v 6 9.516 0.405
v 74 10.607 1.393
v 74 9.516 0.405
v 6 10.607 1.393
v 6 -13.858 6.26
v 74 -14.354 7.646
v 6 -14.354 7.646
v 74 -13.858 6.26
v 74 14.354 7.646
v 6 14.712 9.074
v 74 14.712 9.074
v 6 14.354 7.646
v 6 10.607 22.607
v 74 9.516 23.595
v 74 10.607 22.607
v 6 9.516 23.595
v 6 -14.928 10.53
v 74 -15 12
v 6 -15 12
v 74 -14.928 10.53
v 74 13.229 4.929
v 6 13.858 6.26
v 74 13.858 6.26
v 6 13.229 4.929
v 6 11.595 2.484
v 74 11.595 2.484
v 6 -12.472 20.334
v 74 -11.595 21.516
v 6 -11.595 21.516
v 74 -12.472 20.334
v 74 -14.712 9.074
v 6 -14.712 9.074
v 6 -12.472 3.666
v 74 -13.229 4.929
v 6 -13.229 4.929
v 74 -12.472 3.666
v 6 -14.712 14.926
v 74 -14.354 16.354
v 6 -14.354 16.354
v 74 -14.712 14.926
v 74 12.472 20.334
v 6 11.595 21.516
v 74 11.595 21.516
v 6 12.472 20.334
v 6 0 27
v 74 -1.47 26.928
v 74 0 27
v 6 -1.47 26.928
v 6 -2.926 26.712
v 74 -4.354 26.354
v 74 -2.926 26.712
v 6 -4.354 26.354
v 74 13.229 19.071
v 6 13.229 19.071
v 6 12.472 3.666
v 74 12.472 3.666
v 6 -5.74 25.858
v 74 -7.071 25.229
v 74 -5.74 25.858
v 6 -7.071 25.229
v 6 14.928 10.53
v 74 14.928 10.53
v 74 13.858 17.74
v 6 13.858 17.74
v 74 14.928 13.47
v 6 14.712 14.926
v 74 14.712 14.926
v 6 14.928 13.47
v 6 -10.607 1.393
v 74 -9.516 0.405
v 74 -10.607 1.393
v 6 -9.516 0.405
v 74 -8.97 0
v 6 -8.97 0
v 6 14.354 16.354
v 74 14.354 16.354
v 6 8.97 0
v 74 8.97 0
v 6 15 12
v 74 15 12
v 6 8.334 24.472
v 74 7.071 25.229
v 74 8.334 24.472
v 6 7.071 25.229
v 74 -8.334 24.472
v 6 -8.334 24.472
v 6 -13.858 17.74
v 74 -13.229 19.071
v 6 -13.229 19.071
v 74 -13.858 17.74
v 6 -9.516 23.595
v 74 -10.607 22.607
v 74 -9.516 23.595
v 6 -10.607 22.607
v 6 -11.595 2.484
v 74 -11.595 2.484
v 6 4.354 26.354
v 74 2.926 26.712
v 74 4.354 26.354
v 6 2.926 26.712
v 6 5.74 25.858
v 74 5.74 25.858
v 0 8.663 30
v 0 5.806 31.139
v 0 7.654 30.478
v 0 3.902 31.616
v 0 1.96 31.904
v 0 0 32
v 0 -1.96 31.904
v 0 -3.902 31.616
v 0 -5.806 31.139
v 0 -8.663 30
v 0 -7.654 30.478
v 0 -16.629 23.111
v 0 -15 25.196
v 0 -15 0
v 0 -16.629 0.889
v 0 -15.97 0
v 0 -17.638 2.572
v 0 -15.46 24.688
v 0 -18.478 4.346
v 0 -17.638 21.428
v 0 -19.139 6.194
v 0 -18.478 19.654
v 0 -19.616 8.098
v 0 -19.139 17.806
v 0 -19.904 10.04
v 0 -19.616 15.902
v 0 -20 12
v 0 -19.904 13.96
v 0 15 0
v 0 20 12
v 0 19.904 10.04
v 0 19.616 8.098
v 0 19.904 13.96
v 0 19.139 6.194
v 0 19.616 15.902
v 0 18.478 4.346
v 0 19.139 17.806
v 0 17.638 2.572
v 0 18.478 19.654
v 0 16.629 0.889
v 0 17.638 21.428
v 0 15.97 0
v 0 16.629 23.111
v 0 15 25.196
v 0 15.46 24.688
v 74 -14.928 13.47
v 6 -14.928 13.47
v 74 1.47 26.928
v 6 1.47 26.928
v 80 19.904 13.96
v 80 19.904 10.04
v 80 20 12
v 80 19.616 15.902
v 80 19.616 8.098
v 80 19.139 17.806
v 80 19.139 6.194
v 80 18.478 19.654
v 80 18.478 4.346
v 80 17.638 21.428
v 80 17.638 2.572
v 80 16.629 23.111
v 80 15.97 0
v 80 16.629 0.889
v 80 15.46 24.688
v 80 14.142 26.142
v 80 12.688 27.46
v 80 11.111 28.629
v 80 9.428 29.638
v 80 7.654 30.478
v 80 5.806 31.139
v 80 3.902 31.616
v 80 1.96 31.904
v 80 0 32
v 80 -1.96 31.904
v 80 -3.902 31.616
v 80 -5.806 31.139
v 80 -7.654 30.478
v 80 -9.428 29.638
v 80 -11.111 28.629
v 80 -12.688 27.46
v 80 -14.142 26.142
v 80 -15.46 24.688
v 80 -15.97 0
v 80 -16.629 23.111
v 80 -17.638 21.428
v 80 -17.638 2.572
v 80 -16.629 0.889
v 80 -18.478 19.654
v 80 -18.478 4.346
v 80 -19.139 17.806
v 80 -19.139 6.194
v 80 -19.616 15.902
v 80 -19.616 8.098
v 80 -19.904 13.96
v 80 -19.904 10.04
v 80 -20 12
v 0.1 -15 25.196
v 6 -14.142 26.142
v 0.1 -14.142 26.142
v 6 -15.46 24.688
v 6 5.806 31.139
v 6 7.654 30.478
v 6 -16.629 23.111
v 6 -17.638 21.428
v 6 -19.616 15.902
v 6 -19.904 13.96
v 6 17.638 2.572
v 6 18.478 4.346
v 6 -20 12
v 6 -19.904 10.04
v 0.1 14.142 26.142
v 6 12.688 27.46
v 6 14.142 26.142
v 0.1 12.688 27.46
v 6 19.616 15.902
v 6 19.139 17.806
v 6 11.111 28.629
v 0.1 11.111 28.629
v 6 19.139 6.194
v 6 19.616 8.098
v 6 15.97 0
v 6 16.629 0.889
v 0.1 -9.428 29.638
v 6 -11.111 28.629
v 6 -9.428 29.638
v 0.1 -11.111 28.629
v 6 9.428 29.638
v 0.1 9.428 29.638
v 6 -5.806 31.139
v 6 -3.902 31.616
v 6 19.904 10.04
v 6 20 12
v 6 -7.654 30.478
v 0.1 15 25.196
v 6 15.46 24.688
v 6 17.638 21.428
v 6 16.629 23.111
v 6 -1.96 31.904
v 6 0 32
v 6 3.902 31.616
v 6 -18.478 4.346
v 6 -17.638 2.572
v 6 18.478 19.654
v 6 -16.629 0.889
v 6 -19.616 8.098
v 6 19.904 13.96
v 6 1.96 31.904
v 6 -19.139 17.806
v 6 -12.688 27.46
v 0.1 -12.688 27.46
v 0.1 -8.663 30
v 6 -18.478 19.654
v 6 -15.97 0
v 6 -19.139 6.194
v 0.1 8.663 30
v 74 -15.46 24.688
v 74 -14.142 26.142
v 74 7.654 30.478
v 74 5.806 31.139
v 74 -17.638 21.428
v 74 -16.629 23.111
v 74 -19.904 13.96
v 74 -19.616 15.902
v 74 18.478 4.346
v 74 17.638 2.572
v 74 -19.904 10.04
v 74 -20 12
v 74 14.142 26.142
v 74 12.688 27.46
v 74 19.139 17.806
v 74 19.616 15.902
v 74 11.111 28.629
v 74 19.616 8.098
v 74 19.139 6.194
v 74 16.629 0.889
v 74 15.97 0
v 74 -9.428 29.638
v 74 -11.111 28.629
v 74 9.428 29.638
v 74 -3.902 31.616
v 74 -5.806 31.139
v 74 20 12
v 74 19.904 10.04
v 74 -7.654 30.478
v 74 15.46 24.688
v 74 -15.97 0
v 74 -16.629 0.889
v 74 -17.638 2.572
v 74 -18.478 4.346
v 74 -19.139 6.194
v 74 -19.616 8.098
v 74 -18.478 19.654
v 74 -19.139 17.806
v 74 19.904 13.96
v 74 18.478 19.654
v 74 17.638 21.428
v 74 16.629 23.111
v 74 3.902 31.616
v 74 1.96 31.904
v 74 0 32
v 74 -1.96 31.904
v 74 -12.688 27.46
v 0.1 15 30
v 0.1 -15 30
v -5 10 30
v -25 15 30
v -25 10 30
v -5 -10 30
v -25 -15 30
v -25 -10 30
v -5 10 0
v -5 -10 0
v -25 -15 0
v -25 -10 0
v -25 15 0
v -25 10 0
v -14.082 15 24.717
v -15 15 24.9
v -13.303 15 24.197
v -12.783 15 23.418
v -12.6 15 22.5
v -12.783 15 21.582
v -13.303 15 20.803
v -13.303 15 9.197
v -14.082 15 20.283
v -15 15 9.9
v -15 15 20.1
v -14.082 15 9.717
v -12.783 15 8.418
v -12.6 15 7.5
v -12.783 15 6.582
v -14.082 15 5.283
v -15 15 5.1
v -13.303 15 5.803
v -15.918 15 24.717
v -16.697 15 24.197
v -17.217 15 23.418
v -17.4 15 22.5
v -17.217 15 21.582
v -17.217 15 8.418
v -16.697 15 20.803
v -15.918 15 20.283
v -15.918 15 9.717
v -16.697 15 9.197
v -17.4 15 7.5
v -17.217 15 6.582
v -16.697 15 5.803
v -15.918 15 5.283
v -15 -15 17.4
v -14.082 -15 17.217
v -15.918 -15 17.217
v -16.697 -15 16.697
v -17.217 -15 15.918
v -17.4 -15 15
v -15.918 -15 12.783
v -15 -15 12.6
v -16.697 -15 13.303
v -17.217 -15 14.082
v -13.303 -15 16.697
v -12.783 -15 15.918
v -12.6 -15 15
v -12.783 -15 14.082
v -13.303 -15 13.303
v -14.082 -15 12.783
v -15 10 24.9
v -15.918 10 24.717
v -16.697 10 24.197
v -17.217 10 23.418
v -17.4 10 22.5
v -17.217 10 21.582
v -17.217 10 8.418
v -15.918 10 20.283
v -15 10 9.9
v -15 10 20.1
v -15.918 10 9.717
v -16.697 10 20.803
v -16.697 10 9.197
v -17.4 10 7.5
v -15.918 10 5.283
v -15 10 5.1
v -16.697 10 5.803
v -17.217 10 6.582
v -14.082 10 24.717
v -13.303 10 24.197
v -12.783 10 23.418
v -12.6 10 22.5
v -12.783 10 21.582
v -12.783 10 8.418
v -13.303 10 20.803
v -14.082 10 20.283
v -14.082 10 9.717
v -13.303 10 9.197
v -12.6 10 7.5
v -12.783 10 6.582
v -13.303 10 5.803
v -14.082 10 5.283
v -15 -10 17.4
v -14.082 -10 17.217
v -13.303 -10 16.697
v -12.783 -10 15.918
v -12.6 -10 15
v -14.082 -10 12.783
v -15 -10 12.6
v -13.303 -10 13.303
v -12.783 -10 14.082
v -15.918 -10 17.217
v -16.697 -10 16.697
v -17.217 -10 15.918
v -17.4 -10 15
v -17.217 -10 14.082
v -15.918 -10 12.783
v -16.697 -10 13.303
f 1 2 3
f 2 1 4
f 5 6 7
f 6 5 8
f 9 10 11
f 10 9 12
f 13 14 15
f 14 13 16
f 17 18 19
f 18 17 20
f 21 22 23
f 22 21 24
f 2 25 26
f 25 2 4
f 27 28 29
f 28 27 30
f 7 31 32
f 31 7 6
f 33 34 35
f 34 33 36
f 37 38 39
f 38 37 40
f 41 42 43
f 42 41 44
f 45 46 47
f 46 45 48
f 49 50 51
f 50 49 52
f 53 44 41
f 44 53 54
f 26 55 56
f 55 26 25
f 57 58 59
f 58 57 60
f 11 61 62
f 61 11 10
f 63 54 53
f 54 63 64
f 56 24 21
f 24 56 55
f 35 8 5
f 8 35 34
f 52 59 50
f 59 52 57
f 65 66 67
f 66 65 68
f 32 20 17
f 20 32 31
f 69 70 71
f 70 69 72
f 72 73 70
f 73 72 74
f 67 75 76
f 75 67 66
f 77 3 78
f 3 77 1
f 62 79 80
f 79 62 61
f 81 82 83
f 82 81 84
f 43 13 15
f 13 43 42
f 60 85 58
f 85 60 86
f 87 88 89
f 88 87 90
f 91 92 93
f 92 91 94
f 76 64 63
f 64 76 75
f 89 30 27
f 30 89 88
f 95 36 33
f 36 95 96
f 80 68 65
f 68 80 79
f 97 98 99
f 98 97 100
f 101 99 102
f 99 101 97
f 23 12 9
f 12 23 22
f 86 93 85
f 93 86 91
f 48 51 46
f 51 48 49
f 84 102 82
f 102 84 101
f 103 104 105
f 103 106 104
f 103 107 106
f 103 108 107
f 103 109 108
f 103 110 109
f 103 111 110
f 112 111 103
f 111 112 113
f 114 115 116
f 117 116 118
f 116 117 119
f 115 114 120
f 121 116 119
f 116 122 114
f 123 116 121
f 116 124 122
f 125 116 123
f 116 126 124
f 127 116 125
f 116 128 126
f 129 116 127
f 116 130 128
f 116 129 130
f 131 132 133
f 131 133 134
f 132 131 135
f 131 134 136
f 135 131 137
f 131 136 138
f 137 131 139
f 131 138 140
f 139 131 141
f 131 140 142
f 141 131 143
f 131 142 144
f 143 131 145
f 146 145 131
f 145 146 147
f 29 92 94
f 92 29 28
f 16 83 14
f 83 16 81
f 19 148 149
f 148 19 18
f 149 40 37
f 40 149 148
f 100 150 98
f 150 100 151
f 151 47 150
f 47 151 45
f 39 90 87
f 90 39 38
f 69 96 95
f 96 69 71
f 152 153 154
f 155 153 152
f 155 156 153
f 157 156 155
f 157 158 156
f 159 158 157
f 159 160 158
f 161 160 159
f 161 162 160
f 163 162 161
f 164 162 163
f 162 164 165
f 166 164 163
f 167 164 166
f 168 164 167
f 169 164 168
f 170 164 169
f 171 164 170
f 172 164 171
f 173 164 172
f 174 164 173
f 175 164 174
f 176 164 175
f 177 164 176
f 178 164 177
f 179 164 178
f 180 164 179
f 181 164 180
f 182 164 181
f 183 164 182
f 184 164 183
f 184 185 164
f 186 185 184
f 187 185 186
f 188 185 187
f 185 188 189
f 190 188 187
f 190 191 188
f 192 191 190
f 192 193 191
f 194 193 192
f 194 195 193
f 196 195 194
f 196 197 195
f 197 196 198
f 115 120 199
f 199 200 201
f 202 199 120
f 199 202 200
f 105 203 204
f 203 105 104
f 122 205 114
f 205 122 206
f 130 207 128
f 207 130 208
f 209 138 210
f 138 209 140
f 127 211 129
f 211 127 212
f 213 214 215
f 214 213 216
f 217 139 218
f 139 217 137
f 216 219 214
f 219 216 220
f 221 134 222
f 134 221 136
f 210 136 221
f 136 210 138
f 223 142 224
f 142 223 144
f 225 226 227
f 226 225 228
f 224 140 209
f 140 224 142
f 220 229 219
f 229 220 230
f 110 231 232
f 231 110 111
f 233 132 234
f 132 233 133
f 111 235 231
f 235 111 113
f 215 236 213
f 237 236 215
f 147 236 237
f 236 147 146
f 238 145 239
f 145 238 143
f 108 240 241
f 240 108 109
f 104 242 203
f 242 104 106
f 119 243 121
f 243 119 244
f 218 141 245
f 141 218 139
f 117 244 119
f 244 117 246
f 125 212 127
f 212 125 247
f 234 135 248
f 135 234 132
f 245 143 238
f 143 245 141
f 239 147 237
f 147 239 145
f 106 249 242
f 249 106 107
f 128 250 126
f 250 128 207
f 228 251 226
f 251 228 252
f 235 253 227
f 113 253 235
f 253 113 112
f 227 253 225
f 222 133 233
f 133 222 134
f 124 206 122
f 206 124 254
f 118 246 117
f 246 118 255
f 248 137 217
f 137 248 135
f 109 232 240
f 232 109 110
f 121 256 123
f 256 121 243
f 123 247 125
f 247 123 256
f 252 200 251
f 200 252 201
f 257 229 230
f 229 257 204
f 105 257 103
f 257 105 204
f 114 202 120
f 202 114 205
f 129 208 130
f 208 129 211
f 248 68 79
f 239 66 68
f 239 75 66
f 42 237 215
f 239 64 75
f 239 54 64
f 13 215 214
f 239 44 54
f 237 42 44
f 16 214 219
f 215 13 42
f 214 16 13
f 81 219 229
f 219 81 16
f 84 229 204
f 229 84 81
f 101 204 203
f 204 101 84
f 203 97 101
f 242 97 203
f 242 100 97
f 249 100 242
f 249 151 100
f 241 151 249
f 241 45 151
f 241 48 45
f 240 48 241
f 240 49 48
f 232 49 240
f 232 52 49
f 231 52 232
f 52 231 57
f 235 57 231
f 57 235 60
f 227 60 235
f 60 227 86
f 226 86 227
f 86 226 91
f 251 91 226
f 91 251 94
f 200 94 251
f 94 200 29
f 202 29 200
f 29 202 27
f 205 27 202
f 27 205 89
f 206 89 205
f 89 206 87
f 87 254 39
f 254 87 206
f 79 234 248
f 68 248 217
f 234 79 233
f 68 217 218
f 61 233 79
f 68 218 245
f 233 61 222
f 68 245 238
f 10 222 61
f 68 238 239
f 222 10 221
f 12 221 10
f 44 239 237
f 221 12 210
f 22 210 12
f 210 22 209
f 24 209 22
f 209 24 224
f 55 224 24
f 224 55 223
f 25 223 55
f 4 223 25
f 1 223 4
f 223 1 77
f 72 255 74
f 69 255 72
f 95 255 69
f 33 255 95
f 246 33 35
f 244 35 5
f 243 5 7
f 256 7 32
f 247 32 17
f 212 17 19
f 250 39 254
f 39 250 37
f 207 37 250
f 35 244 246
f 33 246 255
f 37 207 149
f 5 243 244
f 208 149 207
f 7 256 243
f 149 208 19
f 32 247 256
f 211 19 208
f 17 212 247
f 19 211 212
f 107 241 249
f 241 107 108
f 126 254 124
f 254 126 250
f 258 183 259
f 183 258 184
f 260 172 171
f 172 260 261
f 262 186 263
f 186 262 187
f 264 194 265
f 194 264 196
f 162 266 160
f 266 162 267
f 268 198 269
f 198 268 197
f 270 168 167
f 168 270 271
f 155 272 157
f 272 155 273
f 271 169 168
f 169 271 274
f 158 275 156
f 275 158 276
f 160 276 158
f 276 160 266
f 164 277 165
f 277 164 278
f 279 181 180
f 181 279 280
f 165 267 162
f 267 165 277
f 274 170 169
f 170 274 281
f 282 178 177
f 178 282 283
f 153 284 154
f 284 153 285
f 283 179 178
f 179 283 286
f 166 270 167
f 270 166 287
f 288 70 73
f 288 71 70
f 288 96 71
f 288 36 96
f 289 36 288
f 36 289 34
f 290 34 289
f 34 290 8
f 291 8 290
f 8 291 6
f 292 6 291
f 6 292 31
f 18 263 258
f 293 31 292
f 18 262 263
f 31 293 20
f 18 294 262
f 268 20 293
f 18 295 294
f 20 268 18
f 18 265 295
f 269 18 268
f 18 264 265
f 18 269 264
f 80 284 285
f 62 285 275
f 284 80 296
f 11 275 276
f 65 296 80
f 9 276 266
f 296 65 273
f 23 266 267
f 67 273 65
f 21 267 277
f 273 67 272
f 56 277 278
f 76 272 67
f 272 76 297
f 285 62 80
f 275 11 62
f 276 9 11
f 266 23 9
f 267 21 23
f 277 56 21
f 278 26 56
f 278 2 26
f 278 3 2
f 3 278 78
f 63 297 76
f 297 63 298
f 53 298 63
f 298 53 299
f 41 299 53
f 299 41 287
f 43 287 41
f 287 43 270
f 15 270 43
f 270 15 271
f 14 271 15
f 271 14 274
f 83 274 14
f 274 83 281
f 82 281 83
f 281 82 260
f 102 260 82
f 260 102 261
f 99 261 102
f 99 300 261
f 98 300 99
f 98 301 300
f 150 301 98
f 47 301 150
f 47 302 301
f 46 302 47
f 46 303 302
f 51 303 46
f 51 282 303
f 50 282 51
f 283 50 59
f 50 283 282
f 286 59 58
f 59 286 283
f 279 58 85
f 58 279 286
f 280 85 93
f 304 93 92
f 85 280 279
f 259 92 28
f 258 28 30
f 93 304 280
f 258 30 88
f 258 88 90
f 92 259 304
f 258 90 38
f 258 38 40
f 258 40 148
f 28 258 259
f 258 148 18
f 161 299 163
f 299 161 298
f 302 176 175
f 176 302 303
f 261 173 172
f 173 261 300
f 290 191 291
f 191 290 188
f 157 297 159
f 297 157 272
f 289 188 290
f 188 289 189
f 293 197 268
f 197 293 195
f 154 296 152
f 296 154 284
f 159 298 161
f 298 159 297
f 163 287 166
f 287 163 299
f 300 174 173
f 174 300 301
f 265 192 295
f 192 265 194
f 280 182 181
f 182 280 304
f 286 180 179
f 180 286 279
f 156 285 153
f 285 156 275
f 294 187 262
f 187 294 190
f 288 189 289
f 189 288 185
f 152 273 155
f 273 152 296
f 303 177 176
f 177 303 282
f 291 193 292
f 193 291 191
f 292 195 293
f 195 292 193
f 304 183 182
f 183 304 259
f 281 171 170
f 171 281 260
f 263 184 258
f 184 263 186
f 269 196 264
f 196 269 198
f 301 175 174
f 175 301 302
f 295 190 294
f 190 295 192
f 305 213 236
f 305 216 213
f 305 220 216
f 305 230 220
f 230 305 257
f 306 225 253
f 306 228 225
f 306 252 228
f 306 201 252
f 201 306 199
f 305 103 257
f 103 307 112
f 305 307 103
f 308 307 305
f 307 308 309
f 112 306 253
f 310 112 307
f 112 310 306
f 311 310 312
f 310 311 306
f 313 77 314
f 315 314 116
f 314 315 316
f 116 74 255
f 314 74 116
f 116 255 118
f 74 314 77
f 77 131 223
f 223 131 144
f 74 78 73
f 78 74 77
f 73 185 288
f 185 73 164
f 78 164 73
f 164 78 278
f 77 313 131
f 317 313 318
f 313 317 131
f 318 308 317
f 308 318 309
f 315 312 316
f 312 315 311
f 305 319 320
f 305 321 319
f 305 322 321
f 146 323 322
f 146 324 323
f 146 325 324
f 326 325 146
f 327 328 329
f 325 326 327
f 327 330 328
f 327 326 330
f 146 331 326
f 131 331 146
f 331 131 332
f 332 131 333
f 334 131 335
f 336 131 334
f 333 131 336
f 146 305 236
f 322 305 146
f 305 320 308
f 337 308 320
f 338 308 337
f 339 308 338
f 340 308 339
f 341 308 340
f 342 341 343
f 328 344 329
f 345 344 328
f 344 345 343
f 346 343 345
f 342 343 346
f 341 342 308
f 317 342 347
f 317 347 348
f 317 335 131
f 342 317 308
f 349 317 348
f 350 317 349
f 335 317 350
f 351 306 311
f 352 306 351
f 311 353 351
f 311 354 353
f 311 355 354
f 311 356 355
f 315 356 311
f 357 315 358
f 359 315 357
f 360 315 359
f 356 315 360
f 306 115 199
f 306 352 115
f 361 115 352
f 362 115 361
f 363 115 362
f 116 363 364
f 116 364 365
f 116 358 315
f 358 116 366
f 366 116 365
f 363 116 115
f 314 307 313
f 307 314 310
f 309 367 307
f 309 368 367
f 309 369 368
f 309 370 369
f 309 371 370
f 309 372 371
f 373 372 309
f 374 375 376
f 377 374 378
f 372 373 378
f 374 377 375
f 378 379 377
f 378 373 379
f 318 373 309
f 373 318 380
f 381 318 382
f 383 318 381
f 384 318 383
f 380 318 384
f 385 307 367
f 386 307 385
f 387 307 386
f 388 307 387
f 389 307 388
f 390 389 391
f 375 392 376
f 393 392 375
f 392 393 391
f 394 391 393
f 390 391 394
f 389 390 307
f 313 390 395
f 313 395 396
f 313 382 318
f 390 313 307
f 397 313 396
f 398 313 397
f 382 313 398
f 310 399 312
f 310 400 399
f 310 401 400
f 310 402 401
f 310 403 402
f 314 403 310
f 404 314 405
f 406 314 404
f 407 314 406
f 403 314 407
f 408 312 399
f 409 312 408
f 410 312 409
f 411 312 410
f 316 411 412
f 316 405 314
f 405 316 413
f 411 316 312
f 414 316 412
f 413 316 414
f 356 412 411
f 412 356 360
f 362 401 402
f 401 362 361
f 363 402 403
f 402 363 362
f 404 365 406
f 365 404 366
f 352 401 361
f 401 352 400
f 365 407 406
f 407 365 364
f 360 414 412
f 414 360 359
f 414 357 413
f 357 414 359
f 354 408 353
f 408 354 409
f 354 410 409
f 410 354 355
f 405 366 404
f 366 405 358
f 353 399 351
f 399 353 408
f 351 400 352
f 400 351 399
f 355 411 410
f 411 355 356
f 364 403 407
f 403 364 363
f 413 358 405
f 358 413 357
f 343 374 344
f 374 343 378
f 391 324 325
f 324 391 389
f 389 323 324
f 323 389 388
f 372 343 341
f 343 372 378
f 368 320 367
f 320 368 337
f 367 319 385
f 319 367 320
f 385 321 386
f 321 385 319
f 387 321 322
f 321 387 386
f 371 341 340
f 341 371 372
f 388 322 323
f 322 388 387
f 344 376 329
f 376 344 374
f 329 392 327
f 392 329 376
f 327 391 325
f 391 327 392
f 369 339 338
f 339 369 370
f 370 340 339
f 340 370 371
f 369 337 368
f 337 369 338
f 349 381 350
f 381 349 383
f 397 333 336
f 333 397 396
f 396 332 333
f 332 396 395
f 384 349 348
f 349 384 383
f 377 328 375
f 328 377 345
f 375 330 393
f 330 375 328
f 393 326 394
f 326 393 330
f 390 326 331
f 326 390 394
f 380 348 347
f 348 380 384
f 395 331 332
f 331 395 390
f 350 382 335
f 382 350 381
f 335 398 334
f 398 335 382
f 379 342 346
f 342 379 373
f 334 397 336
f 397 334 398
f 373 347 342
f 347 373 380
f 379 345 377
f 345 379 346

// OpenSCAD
// Reel holder for 2020 Kossel

overlap=0.1;
m4radius=2+0.4;

difference () {
	union() {
		translate([0,0,12]) rotate([0,90,0])
			union() {
				translate([0,0,0]) cylinder(r=15,h=80,$fn=64);
				translate([0,0,0]) cylinder(r=20,h=6,$fn=64);
				translate([0,0,80-6]) cylinder(r=20,h=6,$fn=64);
			}
		translate([-25,-15,0]) cube([25+overlap,30,30]);
	}
	translate([0,0,-100]) cube([999,999,200],center=true);
	translate([-25/2-5,0,0]) cube([25,20,100],center=true);
	translate([-15,0,15]) rotate([90,0,0]) cylinder(r=m4radius,h=20,$fn=16);
	translate([-15,0,22.5]) rotate([-90,0,0]) cylinder(r=m4radius,h=20,$fn=16);
	translate([-15,0,7.5]) rotate([-90,0,0]) cylinder(r=m4radius,h=20,$fn=16);
}
